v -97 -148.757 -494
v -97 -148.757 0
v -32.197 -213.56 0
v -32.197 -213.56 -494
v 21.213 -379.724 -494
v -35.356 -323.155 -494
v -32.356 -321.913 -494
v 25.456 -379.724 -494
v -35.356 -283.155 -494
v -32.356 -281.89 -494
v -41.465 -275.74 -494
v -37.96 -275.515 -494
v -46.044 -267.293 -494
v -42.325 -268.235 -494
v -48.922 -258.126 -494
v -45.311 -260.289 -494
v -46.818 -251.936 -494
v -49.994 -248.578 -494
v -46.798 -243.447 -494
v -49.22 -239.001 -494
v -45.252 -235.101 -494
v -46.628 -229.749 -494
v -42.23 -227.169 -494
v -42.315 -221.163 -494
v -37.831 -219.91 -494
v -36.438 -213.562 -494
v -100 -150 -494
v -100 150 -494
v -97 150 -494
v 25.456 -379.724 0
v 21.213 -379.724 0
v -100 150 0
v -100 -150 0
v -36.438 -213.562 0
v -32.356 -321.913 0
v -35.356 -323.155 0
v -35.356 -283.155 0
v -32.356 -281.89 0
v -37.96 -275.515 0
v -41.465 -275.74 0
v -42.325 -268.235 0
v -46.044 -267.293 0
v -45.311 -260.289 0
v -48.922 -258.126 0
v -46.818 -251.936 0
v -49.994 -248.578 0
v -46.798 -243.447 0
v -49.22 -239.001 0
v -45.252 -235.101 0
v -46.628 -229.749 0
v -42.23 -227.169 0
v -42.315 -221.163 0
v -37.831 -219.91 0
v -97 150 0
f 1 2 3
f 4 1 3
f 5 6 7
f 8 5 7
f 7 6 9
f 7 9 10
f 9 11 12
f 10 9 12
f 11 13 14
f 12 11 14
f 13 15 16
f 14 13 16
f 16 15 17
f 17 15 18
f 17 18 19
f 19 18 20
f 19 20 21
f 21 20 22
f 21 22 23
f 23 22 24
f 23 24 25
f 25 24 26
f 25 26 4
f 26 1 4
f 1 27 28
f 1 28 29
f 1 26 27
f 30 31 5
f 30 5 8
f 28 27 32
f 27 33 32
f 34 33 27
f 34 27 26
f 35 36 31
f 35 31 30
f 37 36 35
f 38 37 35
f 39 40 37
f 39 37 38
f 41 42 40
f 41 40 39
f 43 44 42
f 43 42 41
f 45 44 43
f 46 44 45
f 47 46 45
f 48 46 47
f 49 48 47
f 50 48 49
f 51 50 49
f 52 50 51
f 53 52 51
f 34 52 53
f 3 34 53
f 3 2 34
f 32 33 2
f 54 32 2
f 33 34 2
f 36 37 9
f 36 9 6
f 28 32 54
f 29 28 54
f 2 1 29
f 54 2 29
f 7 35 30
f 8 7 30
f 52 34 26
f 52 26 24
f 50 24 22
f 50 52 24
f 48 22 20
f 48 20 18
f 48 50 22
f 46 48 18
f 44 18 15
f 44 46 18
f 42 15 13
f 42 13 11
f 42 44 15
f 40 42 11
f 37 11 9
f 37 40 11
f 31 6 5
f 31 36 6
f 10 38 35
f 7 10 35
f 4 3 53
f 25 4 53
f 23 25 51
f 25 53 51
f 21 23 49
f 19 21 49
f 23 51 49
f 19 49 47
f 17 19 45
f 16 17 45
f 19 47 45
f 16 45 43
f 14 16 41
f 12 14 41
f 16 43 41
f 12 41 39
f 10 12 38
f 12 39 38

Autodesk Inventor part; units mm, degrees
ref_plane "YZ Plane" through (0, 0, 0) normal (1, 0, 0) x (0, 1, 0)
ref_plane "XZ Plane" through (0, 0, 0) normal (0, 1, 0) x (-1, 0, 0)
ref_plane "XY Plane" through (0, 0, 0) normal (0, 0, 1) x (1, 0, 0)
sketch "Sketch1" plane through (0, 0, 0) normal (0, 0, 1) x (1, 0, 0)
  circle A0 centre (-0.0003, -247.8) radius 2.5
  line L0 (-100, -150) -> (-36.4384, -213.5616)
  line L1 (-100, -150) -> (-50, -150) construction
  line L2 (-36.4384, -213.5616) -> (-36.4394, -213.5606)
  line L3 (-35.3556, -283.1553) -> (-35.3556, -323.1553)
  line L4 (-35.3556, -283.1553) -> (4.6444, -283.1553) construction
  line L5 (-35.3556, -323.1553) -> (21.2129, -379.7239)
  arc A1 (-36.4384, -213.5616) -> (-35.3556, -283.1553) centre (-0.0003, -247.8) ccw
  line L6 (-32.3556, -281.8901) -> (-32.3556, -321.9127)
  line L7 (-32.3556, -321.9127) -> (25.4556, -379.7239)
  line L8 (-97, -148.7574) -> (-32.1971, -213.5602)
  arc A2 (-32.1971, -213.5602) -> (-32.3556, -281.8901) centre (-0.0003, -247.8) ccw
  line L9 (21.2129, -379.7239) -> (25.4556, -379.7239)
  line L10 (-100, -150) -> (-100, 150)
  line L11 (-97, -148.7574) -> (-97, 150)
  line L12 (-100, 150) -> (-97, 150)
  dimension "d0" = 5
  dimension "d1" = 45
  dimension "d3" = 50
  dimension "d5" = 40
  dimension "d6" = 90
  dimension "d7" = 80
  dimension "d8" = 135
  dimension "d13" = 3
  dimension "d16" = 3
  dimension "d17" = 3
  dimension "d19" = 35.3553
  dimension "d20" = 3
  dimension "d21" = 300
extrude "Extrusion1" add sketch "Sketch1" against normal blind 494 contours L10 L12 L11 L8 A2 L6 L7 L9 L5 L3 A1 L0
properties part number "back"
